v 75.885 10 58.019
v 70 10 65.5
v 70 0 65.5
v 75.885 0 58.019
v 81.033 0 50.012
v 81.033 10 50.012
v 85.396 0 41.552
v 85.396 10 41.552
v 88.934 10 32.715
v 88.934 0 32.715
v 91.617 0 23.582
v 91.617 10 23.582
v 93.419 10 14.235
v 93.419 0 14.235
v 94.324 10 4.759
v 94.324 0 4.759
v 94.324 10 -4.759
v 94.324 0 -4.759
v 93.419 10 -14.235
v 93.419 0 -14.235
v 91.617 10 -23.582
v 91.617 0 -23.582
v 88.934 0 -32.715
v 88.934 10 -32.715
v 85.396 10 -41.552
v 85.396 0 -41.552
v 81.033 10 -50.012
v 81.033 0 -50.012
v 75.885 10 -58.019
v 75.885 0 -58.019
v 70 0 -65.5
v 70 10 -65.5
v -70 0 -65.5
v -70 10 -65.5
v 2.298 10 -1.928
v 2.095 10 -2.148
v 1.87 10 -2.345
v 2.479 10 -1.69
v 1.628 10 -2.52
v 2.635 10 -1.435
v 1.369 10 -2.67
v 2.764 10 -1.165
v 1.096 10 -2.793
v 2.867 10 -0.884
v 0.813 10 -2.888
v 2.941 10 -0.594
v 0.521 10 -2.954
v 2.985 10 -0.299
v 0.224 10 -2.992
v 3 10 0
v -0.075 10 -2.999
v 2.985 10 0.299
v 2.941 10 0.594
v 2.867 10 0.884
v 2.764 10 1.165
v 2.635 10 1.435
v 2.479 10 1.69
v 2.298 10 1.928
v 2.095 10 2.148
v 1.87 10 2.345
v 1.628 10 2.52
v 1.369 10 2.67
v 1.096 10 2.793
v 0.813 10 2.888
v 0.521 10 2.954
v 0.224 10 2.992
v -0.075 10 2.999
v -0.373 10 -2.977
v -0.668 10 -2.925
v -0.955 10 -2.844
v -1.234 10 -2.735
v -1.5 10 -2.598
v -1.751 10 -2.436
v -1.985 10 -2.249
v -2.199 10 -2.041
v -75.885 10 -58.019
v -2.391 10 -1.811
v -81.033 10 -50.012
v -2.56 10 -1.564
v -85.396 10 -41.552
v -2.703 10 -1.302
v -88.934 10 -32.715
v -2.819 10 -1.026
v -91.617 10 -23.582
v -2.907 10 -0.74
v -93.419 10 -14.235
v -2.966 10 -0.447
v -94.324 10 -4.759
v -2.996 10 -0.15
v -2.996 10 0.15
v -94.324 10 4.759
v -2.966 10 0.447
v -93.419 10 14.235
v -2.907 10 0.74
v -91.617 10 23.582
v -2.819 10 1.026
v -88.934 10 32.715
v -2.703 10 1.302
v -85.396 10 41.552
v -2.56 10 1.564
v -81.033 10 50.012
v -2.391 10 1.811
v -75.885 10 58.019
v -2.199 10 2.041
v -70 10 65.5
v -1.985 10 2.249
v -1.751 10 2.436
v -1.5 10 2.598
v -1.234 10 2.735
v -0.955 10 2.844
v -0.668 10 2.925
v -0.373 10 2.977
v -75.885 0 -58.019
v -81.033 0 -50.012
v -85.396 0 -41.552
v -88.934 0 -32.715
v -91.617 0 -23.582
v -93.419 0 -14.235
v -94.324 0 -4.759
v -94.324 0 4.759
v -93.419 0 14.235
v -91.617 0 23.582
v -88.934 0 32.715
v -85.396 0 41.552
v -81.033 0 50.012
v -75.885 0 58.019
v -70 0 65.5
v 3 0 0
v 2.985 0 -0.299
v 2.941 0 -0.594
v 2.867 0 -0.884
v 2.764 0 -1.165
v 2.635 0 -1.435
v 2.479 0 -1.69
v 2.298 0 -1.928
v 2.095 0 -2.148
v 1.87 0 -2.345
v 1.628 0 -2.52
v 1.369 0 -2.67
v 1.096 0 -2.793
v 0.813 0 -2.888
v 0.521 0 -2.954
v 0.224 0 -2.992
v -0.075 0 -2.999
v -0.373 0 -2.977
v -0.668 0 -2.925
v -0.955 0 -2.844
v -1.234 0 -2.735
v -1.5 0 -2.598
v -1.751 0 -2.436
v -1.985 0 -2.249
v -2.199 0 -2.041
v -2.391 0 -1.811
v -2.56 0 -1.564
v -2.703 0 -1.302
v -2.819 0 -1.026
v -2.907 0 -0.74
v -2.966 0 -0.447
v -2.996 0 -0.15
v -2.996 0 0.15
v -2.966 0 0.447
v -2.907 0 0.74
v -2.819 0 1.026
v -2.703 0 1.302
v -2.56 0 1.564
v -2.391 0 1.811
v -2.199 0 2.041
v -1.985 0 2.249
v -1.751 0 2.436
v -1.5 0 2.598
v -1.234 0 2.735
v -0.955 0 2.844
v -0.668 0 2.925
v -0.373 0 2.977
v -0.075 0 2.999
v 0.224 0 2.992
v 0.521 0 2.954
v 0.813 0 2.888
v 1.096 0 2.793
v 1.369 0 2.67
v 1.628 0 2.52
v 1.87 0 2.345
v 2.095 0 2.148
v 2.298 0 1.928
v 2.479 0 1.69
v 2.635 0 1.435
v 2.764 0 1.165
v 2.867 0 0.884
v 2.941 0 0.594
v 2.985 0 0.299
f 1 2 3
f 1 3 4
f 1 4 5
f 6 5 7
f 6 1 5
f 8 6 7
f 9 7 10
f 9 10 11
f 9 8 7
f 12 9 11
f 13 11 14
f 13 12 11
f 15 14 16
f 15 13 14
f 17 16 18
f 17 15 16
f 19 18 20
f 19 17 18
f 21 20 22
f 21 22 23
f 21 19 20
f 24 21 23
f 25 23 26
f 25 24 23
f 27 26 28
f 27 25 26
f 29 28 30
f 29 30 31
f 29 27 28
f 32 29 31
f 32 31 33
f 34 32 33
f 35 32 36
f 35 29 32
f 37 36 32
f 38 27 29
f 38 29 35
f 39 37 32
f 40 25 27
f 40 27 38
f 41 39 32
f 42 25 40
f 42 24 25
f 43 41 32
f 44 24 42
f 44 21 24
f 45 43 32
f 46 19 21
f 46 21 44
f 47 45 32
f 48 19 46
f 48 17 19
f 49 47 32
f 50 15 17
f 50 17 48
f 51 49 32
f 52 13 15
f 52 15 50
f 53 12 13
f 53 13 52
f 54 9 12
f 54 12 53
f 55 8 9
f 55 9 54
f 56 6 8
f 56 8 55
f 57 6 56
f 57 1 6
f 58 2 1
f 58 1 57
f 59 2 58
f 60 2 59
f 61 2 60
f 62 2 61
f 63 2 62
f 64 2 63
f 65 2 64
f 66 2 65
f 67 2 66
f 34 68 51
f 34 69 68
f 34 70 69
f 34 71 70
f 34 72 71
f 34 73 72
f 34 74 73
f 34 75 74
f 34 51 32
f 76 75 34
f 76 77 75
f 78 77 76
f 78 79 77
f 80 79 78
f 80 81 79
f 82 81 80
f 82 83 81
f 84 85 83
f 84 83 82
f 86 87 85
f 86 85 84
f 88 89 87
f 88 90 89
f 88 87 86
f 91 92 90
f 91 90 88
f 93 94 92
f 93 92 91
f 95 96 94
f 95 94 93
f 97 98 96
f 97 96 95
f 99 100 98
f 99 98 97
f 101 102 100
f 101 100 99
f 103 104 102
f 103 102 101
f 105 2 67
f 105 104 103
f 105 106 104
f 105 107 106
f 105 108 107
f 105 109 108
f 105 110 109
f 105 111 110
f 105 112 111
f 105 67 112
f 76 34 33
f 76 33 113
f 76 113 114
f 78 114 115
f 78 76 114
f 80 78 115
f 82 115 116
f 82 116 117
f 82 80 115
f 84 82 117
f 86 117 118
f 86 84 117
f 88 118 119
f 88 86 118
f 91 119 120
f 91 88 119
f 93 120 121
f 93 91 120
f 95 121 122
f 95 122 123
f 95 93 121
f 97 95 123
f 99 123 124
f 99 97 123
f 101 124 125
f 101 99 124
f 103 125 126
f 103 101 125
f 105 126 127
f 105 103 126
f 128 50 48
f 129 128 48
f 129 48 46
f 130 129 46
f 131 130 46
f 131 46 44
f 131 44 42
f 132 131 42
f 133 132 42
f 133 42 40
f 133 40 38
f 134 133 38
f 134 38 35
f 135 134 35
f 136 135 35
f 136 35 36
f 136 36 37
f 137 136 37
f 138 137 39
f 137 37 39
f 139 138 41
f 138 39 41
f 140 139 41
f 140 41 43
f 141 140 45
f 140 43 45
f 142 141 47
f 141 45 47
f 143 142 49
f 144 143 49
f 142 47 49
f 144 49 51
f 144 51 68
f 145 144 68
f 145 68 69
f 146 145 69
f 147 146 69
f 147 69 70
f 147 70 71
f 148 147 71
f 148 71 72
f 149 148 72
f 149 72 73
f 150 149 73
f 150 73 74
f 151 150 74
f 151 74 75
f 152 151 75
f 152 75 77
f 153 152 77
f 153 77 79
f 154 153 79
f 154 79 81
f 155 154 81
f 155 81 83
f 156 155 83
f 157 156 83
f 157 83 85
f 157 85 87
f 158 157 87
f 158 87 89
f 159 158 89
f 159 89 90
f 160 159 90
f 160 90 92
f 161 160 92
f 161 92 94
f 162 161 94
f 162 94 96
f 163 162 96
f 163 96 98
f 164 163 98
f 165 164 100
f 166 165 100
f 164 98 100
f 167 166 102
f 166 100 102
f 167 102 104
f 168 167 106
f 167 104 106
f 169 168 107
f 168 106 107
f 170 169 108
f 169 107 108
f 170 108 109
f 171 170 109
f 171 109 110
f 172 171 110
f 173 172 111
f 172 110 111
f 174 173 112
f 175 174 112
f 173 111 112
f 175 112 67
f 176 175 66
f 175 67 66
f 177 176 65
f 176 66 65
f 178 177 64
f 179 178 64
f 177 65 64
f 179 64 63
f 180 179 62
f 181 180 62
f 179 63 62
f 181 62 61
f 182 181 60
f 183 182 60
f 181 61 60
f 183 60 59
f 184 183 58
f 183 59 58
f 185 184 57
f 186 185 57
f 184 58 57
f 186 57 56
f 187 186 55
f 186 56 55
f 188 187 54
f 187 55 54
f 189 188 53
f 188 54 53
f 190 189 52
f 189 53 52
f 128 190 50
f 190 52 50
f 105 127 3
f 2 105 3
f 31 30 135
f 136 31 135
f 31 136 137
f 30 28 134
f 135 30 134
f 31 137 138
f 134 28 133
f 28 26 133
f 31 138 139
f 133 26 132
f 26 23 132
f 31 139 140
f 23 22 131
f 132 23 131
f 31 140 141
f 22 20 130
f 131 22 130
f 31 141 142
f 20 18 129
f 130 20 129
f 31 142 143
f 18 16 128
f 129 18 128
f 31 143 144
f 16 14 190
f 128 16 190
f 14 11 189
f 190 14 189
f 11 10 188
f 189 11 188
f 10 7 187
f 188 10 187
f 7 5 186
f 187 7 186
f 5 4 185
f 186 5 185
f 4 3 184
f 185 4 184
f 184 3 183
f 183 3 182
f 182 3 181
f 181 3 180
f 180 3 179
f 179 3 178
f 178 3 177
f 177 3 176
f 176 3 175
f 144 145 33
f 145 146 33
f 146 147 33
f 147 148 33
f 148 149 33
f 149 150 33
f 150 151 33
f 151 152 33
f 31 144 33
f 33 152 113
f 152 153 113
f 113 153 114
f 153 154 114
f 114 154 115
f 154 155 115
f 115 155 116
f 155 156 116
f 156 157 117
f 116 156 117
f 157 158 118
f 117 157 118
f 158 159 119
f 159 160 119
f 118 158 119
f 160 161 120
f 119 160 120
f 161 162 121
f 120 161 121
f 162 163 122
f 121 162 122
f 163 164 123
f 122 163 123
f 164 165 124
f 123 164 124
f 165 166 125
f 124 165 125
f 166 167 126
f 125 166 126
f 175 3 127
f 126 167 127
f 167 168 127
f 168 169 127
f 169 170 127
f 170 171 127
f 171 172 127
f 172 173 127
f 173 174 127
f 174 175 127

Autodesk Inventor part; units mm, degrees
ref_plane "YZ Plane" through (0, 0, 0) normal (1, 0, 0) x (0, 1, 0)
ref_plane "XZ Plane" through (0, 0, 0) normal (0, 1, 0) x (-1, 0, 0)
ref_plane "XY Plane" through (0, 0, 0) normal (0, 0, 1) x (1, 0, 0)
sketch "Sketch1" plane through (0, 0, 0) normal (0, 1, 0) x (-1, 0, 0)
  line L0 (70, 65.5) -> (-70, 65.5)
  line L1 (-70, 65.5) -> (-70, -65.5)
  line L2 (-70, -65.5) -> (70, -65.5)
  line L3 (70, -65.5) -> (70, 65.5)
  line L4 (70, 65.5) -> (-70, -65.5) construction
  line L5 (-70, 65.5) -> (70, -65.5) construction
  circle A0 centre (0, 0) radius 7.5
  dimension "d0" = 140
  dimension "d1" = 131
  dimension "d2" = 15
extrude "Extrusion1" add sketch "Sketch1" along normal blind 10
sketch "Sketch2" plane through (0, 10, 0) normal (0, 1, 0) x (1, 0, 0)
  circle A0 centre (0, 0) radius 7.5 projected
  circle A1 centre (0, 0) radius 3
  dimension "d5" = 6
extrude "Extrusion2" add sketch "Sketch2" against normal blind 10
sketch "Sketch3" plane through (0, 10, 0) normal (0, 1, 0) x (1, 0, 0)
  line L0 (70, -65.5) -> (70, 65.5) projected
  line L1 (-70, 65.5) -> (-70, -65.5) projected
  arc A0 (70, -65.5) -> (70, 65.5) centre (-5.5629, 0) ccw
  arc A1 (-70, 65.5) -> (-70, -65.5) centre (5.5629, 0) ccw
  dimension "d10" = 100
  dimension "d11" = 100
extrude "Extrusion3" add sketch "Sketch3" against normal blind 10
properties part number "deska_pod_rameno"
